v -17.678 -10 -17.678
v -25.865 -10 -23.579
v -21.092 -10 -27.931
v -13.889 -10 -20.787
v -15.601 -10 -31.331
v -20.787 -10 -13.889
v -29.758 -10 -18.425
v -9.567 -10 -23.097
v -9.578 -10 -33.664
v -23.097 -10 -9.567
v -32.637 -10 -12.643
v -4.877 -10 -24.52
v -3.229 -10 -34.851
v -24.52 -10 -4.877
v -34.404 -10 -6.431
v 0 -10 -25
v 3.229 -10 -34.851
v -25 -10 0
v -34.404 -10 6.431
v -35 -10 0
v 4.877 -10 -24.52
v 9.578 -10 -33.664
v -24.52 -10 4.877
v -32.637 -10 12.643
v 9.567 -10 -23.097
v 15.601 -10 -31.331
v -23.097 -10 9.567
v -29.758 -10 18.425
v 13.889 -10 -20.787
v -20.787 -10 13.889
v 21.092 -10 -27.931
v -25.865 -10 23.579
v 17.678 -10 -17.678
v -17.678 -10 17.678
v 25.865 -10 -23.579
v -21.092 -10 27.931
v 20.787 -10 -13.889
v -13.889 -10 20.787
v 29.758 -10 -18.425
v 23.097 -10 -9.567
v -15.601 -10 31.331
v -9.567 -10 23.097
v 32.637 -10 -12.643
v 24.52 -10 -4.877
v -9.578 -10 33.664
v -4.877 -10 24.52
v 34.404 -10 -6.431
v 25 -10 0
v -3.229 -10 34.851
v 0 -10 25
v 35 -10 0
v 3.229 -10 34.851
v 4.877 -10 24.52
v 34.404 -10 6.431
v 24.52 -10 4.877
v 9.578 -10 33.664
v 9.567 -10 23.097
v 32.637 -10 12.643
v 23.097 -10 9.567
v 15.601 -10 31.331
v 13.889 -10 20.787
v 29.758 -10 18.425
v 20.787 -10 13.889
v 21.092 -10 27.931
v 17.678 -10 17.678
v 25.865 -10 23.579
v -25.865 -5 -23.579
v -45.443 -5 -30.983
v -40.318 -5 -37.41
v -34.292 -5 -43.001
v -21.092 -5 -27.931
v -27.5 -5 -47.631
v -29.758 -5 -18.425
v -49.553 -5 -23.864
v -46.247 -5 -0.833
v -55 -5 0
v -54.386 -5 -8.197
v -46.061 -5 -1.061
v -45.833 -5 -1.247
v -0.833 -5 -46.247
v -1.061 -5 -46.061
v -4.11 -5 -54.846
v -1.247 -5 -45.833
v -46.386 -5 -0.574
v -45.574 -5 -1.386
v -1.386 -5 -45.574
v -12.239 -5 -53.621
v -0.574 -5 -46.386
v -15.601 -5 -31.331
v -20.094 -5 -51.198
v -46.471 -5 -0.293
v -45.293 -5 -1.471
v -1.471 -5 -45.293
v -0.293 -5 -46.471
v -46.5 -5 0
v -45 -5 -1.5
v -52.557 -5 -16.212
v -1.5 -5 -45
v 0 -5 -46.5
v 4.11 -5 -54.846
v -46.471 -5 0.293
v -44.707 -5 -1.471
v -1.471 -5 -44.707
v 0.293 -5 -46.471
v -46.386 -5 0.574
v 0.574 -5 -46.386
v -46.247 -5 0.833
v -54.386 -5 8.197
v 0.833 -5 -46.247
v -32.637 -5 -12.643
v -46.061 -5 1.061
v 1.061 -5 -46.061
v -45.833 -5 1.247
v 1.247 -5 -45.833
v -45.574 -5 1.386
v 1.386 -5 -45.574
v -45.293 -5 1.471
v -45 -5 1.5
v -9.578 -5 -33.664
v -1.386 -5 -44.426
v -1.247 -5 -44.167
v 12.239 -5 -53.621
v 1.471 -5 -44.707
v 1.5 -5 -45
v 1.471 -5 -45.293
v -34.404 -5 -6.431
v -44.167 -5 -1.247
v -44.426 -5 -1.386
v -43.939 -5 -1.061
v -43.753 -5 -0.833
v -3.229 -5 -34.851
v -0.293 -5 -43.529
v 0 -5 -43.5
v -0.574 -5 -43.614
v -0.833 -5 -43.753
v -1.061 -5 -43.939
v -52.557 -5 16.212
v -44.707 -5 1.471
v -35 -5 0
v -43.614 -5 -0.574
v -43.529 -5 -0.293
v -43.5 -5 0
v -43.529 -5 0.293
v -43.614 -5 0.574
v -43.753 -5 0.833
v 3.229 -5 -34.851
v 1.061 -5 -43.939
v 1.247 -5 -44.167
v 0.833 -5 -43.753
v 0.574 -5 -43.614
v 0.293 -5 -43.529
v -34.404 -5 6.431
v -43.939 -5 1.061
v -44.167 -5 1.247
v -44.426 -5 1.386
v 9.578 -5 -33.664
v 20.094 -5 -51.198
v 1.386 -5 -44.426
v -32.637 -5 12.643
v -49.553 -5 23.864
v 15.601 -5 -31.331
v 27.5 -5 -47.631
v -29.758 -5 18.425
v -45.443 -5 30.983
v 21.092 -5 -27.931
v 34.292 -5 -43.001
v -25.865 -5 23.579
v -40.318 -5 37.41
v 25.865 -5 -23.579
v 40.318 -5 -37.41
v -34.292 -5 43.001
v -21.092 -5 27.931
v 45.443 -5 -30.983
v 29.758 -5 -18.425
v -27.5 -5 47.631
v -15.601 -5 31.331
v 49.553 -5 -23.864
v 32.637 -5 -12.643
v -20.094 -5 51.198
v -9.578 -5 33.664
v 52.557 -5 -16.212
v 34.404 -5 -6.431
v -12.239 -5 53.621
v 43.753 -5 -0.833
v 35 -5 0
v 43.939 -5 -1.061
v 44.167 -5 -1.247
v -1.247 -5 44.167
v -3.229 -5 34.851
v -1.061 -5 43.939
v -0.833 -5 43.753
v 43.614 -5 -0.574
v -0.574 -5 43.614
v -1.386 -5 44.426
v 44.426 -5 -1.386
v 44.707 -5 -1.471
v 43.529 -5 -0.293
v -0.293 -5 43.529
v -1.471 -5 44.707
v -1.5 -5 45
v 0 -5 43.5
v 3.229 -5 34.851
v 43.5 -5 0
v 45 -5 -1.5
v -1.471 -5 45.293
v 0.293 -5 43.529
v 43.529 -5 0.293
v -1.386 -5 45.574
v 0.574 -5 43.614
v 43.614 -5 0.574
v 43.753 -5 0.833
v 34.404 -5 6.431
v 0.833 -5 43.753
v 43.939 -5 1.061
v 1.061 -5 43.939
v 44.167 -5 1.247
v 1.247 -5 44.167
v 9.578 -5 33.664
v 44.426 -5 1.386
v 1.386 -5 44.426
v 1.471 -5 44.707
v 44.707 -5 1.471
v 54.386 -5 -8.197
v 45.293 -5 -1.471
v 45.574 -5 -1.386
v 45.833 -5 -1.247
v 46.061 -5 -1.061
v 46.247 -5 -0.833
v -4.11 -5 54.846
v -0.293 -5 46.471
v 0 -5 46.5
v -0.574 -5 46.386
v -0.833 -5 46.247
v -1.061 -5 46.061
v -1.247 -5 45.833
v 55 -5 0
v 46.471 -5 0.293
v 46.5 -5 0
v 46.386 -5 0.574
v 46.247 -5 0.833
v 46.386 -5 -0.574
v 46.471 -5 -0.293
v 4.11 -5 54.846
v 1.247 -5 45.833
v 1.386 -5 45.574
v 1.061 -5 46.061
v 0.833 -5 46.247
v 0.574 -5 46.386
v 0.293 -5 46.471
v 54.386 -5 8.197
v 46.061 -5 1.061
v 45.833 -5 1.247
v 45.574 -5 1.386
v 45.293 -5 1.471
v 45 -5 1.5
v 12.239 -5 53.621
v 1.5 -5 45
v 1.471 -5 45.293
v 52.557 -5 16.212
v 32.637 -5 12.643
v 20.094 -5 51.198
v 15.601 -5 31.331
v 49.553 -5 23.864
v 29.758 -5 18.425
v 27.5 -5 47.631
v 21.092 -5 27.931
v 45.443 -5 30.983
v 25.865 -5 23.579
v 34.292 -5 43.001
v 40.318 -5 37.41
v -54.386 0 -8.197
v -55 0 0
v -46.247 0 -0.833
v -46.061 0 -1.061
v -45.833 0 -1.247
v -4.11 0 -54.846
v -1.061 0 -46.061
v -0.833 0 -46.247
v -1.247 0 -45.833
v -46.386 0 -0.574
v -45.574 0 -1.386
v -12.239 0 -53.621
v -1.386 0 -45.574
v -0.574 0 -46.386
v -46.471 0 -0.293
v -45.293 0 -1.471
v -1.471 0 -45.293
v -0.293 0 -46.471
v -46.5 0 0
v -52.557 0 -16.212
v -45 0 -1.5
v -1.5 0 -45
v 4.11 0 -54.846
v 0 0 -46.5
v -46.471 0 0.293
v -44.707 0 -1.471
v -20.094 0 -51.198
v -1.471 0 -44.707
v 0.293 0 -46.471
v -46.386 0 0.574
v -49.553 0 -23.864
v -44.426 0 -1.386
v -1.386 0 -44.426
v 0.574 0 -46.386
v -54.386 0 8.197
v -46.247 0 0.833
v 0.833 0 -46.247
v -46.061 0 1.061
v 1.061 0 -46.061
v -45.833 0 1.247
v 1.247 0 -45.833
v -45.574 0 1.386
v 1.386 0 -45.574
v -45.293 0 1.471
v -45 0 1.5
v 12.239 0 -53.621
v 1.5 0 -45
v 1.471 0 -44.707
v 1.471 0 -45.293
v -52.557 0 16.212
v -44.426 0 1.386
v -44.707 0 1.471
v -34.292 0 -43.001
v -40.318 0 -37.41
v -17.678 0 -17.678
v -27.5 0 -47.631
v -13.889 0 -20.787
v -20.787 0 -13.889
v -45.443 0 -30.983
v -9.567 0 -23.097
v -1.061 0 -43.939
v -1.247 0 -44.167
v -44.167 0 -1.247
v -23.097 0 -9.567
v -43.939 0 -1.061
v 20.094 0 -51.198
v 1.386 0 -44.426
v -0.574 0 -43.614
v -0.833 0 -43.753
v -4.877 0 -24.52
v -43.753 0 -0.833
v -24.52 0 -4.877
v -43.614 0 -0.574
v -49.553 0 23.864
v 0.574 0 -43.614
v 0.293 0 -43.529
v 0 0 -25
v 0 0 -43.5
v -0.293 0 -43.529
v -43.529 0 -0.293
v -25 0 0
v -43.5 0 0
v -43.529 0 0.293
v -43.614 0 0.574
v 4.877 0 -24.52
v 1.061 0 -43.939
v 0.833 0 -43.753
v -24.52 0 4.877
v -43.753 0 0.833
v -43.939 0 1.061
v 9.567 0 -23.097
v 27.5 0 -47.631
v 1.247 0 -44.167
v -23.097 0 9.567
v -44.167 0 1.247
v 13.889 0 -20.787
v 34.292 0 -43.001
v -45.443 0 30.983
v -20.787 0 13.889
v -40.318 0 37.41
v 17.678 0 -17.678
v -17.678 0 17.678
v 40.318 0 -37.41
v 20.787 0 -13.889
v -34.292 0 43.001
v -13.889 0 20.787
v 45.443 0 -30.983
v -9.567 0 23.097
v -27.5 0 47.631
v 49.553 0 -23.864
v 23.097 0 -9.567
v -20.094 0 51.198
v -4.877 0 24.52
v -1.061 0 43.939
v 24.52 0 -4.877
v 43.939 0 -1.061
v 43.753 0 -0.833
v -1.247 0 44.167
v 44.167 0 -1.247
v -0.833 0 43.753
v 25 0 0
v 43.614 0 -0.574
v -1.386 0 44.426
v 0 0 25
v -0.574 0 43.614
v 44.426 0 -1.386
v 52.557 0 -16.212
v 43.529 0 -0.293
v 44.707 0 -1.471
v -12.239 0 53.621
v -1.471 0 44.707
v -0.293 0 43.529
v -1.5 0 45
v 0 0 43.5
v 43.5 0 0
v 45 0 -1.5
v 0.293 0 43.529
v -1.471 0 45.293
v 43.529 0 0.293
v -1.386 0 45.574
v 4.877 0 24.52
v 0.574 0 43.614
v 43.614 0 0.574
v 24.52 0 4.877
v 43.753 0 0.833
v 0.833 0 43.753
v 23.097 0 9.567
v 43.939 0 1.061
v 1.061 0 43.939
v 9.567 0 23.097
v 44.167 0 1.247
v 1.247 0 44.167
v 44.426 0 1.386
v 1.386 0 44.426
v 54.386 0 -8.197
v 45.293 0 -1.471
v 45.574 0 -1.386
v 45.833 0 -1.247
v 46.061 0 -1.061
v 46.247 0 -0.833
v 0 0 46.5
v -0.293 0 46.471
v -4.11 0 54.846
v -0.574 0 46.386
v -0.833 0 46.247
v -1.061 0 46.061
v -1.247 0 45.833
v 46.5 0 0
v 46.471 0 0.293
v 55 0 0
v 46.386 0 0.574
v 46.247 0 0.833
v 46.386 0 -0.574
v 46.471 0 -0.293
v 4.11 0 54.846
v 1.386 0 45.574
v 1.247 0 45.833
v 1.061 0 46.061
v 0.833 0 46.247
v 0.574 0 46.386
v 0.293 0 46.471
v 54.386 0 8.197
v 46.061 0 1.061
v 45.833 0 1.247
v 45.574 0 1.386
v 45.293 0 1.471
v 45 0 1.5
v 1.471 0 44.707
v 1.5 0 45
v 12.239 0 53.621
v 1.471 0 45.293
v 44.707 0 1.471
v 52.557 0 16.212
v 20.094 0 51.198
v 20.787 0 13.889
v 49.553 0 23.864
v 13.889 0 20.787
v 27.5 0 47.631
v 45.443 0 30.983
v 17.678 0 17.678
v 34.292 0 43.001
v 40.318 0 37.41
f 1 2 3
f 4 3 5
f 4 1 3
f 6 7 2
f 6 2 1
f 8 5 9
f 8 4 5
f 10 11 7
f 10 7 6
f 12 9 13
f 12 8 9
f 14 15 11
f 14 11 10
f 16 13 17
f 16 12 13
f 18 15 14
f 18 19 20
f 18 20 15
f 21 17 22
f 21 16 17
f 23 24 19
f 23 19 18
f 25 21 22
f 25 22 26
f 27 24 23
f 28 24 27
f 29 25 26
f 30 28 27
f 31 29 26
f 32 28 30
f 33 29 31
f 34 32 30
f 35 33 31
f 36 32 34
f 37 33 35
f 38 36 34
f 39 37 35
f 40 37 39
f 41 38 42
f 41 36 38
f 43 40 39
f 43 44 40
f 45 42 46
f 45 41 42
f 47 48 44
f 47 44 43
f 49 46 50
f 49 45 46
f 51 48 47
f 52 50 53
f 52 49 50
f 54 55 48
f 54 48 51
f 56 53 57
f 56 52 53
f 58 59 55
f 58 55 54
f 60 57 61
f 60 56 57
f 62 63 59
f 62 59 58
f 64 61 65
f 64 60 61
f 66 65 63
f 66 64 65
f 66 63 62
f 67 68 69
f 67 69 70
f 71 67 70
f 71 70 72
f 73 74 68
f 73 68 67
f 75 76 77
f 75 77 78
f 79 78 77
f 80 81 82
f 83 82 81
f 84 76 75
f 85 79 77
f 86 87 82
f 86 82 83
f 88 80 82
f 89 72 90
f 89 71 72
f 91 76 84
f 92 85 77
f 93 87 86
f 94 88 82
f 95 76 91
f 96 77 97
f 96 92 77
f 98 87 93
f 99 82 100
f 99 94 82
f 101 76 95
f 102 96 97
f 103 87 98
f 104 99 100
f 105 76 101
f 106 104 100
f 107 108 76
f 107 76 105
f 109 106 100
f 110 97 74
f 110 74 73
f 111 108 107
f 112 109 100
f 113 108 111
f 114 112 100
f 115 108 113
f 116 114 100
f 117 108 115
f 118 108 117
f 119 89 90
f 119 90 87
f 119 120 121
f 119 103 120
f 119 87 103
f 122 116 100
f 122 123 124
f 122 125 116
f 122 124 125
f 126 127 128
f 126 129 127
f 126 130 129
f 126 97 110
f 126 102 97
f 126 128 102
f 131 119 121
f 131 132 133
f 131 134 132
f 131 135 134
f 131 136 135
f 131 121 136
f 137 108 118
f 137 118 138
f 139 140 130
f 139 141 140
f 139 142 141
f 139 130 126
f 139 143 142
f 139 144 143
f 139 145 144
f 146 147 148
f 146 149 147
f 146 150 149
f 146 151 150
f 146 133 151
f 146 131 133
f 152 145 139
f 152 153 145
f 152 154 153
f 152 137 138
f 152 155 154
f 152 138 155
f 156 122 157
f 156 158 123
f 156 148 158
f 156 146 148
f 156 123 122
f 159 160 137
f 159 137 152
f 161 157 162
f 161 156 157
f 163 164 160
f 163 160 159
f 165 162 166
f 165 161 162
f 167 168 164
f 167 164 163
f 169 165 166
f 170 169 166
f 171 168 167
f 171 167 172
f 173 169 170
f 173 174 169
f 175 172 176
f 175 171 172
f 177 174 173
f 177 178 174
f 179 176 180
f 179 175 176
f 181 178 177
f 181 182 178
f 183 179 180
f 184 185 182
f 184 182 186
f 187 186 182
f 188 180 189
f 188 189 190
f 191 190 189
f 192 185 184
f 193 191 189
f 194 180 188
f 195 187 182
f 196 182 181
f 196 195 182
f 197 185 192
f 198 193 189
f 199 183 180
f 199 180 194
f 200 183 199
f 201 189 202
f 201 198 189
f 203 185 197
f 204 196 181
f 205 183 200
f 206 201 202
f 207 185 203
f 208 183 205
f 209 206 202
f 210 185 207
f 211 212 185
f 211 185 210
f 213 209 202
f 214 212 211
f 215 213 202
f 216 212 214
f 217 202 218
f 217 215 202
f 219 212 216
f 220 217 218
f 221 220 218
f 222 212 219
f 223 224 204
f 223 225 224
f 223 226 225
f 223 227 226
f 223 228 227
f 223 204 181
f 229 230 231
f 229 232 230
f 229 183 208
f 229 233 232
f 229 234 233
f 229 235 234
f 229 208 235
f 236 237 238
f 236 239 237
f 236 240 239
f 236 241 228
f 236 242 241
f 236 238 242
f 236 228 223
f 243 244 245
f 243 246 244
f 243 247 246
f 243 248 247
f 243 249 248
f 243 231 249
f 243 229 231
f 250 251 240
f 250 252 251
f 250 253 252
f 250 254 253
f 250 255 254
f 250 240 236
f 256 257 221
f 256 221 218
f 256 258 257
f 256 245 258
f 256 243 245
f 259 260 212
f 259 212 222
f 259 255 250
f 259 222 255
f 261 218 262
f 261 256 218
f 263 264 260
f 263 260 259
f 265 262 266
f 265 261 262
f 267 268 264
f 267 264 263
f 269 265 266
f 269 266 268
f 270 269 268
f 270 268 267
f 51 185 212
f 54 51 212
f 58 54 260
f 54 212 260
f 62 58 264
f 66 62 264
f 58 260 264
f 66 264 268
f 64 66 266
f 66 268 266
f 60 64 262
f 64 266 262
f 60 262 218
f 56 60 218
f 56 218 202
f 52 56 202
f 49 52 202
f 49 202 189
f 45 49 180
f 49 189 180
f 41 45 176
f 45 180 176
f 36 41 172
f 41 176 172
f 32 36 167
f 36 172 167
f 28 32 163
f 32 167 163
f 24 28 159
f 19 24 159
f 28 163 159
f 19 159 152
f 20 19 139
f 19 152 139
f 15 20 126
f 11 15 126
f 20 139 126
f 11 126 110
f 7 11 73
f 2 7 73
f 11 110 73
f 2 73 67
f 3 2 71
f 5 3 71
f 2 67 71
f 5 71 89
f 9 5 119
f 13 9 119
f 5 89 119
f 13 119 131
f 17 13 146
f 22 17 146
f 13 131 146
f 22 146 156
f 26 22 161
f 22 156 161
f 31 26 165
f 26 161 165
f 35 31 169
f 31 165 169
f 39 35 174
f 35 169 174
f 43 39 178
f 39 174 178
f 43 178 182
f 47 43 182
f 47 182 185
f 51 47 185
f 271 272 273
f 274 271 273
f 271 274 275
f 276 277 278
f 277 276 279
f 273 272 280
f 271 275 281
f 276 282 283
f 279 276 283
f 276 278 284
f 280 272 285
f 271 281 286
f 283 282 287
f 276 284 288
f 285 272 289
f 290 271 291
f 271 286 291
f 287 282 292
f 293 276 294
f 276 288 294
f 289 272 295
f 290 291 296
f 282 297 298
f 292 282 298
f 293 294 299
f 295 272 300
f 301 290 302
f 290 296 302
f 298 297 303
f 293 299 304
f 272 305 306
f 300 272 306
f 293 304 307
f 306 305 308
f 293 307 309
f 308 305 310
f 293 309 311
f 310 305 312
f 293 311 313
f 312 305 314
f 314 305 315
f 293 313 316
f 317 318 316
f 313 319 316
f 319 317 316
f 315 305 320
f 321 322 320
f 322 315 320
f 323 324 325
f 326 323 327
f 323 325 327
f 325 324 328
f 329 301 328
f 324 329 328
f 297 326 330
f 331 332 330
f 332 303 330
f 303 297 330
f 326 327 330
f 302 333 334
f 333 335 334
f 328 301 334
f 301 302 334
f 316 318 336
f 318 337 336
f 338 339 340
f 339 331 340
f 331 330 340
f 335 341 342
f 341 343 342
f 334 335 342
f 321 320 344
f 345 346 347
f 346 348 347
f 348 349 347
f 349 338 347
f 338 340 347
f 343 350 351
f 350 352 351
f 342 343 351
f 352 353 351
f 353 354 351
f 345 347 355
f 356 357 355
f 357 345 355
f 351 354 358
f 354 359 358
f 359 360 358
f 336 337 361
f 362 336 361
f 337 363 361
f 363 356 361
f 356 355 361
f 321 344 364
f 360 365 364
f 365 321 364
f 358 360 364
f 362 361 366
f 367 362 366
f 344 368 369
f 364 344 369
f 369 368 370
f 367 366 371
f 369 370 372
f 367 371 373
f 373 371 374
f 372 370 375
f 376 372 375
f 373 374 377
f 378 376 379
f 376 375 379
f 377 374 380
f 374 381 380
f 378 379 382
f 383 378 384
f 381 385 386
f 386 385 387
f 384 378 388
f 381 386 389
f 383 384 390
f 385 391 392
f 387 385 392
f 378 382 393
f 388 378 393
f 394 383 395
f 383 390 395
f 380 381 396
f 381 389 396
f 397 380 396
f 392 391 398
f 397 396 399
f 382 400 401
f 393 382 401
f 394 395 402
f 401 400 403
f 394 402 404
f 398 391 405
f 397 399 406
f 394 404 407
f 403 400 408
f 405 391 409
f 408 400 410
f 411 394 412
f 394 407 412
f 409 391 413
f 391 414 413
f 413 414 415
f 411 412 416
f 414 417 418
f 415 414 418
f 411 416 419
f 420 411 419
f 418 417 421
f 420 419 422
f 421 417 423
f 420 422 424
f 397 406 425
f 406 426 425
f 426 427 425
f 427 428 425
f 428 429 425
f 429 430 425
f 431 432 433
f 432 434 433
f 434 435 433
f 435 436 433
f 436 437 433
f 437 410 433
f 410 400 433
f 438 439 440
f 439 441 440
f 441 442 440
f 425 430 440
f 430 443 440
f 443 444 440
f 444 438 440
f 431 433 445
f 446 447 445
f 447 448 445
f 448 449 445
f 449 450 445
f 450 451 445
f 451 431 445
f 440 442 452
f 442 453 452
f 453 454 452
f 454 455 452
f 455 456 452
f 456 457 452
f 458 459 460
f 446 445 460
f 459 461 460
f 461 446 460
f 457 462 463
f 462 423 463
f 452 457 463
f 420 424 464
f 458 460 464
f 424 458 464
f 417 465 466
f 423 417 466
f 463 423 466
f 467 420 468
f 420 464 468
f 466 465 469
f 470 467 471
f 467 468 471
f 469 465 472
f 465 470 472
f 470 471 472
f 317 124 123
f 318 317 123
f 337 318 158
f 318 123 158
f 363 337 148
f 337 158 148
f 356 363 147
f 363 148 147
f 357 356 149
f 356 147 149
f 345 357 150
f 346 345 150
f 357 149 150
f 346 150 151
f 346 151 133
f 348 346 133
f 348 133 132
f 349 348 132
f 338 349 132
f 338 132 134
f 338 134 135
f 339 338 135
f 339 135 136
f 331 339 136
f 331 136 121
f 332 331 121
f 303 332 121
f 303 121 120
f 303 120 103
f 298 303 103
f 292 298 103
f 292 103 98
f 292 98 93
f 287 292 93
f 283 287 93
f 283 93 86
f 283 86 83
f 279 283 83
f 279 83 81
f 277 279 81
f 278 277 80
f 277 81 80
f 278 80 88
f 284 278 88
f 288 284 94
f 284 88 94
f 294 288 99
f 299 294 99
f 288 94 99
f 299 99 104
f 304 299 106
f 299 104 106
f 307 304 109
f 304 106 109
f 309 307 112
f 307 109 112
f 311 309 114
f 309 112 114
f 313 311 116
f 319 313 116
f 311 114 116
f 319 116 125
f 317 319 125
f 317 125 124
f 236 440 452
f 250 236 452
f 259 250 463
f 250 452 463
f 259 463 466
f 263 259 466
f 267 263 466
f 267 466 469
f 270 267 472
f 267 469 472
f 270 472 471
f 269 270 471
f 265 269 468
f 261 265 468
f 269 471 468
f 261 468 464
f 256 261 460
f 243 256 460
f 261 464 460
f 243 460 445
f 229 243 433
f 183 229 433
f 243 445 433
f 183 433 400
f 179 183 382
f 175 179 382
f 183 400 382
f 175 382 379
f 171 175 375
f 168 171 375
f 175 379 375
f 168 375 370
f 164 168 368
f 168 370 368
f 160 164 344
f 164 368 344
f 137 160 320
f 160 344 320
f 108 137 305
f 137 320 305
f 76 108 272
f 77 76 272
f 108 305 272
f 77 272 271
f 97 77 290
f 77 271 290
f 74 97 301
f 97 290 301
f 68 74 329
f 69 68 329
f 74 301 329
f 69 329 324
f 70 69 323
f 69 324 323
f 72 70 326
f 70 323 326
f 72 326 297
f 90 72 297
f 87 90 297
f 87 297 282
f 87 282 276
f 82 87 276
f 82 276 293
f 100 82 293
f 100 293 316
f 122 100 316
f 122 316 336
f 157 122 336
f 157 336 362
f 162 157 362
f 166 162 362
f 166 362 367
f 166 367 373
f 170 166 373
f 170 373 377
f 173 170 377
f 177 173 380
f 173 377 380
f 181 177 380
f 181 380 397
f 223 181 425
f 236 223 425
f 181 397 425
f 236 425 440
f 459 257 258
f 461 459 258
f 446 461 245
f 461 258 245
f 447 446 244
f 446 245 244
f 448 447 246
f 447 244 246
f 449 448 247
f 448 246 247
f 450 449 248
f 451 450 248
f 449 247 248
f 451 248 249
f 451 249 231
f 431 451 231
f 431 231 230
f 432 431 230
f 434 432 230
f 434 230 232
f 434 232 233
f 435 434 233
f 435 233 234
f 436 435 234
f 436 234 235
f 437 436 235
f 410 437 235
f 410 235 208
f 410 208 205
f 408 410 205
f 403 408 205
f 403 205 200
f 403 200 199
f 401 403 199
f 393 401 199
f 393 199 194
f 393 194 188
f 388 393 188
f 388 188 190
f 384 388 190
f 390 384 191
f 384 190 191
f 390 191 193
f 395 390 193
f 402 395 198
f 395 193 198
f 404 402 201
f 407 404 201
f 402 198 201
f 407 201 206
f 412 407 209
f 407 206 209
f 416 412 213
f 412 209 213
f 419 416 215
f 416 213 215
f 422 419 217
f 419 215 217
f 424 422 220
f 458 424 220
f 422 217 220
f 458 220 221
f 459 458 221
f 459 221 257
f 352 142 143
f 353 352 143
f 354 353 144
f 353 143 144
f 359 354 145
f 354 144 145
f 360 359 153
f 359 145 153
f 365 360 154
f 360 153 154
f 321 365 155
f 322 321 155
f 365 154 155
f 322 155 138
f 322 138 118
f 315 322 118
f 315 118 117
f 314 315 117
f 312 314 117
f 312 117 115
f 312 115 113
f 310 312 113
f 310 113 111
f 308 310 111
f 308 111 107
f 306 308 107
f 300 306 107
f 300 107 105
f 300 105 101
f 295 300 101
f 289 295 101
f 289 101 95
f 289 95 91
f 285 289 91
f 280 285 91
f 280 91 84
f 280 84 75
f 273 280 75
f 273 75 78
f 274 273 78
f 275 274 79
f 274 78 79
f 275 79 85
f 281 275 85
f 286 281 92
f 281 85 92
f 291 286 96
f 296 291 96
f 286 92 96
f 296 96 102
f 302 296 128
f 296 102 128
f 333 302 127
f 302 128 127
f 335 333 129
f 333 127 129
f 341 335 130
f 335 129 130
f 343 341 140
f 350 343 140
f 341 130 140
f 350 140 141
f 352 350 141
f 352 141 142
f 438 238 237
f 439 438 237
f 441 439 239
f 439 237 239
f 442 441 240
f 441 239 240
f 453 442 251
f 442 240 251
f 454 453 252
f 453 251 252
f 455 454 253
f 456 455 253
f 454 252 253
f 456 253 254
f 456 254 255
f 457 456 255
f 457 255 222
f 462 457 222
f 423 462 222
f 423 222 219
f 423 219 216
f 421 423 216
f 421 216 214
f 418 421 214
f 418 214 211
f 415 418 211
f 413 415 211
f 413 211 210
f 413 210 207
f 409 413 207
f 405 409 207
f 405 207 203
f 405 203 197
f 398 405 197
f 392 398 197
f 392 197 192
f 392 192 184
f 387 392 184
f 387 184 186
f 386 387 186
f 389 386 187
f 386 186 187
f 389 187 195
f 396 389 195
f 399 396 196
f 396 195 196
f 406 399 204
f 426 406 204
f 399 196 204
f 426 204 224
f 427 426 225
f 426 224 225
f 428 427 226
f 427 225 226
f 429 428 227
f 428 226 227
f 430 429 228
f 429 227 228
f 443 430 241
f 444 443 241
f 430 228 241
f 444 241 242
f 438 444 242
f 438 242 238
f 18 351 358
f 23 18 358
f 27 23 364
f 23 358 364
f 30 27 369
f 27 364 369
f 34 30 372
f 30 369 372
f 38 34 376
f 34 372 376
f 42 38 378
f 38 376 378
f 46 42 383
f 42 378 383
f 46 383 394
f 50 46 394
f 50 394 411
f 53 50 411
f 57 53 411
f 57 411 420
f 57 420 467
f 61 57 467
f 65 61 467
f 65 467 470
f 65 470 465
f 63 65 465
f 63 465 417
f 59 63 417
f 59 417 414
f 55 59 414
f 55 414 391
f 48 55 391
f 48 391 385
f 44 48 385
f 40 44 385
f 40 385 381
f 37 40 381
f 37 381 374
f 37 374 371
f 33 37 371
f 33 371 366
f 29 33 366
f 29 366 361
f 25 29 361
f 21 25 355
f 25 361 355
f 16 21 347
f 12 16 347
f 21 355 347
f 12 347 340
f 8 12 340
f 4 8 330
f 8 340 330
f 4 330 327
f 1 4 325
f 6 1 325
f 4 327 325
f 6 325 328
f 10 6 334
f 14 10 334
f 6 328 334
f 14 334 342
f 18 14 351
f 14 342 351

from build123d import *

# Parameters (mm, degrees)
F0_R     = 55
F1_DEPTH = 5
F2_R     = 35
F3_DEPTH = 5
F4_R     = 25
F5_DEPTH = 25
F6_R     = 1.5
F7_DEPTH = 12


with BuildPart() as f1:
    # F0 (on Front) → F1 (new body)
    with BuildSketch(Plane.XZ):
        Circle(F0_R)
    extrude(amount=F1_DEPTH)

    # F2 (on face) → F3 (join)
    with BuildSketch(Plane.XZ.offset(5)):
        Circle(F2_R)
    extrude(amount=F3_DEPTH)

    # F4 (on face) → F5 (cut)
    with BuildSketch(Plane(origin=(0, 0, 0), x_dir=(-1, 0, 0), z_dir=(0, 1, 0))):
        Circle(F4_R)
    extrude(amount=-F5_DEPTH, mode=Mode.SUBTRACT)

    # F6 (on face) → F7 (cut)
    with BuildSketch(Plane.XZ.offset(10)):
        with Locations((-45, 0)):
            Circle(F6_R)
        with Locations((0, 45)):
            Circle(F6_R)
        with Locations((0, -45)):
            Circle(F6_R)
        with Locations((45, 0)):
            Circle(F6_R)
    extrude(amount=-F7_DEPTH, mode=Mode.SUBTRACT)


solid = f1.part
